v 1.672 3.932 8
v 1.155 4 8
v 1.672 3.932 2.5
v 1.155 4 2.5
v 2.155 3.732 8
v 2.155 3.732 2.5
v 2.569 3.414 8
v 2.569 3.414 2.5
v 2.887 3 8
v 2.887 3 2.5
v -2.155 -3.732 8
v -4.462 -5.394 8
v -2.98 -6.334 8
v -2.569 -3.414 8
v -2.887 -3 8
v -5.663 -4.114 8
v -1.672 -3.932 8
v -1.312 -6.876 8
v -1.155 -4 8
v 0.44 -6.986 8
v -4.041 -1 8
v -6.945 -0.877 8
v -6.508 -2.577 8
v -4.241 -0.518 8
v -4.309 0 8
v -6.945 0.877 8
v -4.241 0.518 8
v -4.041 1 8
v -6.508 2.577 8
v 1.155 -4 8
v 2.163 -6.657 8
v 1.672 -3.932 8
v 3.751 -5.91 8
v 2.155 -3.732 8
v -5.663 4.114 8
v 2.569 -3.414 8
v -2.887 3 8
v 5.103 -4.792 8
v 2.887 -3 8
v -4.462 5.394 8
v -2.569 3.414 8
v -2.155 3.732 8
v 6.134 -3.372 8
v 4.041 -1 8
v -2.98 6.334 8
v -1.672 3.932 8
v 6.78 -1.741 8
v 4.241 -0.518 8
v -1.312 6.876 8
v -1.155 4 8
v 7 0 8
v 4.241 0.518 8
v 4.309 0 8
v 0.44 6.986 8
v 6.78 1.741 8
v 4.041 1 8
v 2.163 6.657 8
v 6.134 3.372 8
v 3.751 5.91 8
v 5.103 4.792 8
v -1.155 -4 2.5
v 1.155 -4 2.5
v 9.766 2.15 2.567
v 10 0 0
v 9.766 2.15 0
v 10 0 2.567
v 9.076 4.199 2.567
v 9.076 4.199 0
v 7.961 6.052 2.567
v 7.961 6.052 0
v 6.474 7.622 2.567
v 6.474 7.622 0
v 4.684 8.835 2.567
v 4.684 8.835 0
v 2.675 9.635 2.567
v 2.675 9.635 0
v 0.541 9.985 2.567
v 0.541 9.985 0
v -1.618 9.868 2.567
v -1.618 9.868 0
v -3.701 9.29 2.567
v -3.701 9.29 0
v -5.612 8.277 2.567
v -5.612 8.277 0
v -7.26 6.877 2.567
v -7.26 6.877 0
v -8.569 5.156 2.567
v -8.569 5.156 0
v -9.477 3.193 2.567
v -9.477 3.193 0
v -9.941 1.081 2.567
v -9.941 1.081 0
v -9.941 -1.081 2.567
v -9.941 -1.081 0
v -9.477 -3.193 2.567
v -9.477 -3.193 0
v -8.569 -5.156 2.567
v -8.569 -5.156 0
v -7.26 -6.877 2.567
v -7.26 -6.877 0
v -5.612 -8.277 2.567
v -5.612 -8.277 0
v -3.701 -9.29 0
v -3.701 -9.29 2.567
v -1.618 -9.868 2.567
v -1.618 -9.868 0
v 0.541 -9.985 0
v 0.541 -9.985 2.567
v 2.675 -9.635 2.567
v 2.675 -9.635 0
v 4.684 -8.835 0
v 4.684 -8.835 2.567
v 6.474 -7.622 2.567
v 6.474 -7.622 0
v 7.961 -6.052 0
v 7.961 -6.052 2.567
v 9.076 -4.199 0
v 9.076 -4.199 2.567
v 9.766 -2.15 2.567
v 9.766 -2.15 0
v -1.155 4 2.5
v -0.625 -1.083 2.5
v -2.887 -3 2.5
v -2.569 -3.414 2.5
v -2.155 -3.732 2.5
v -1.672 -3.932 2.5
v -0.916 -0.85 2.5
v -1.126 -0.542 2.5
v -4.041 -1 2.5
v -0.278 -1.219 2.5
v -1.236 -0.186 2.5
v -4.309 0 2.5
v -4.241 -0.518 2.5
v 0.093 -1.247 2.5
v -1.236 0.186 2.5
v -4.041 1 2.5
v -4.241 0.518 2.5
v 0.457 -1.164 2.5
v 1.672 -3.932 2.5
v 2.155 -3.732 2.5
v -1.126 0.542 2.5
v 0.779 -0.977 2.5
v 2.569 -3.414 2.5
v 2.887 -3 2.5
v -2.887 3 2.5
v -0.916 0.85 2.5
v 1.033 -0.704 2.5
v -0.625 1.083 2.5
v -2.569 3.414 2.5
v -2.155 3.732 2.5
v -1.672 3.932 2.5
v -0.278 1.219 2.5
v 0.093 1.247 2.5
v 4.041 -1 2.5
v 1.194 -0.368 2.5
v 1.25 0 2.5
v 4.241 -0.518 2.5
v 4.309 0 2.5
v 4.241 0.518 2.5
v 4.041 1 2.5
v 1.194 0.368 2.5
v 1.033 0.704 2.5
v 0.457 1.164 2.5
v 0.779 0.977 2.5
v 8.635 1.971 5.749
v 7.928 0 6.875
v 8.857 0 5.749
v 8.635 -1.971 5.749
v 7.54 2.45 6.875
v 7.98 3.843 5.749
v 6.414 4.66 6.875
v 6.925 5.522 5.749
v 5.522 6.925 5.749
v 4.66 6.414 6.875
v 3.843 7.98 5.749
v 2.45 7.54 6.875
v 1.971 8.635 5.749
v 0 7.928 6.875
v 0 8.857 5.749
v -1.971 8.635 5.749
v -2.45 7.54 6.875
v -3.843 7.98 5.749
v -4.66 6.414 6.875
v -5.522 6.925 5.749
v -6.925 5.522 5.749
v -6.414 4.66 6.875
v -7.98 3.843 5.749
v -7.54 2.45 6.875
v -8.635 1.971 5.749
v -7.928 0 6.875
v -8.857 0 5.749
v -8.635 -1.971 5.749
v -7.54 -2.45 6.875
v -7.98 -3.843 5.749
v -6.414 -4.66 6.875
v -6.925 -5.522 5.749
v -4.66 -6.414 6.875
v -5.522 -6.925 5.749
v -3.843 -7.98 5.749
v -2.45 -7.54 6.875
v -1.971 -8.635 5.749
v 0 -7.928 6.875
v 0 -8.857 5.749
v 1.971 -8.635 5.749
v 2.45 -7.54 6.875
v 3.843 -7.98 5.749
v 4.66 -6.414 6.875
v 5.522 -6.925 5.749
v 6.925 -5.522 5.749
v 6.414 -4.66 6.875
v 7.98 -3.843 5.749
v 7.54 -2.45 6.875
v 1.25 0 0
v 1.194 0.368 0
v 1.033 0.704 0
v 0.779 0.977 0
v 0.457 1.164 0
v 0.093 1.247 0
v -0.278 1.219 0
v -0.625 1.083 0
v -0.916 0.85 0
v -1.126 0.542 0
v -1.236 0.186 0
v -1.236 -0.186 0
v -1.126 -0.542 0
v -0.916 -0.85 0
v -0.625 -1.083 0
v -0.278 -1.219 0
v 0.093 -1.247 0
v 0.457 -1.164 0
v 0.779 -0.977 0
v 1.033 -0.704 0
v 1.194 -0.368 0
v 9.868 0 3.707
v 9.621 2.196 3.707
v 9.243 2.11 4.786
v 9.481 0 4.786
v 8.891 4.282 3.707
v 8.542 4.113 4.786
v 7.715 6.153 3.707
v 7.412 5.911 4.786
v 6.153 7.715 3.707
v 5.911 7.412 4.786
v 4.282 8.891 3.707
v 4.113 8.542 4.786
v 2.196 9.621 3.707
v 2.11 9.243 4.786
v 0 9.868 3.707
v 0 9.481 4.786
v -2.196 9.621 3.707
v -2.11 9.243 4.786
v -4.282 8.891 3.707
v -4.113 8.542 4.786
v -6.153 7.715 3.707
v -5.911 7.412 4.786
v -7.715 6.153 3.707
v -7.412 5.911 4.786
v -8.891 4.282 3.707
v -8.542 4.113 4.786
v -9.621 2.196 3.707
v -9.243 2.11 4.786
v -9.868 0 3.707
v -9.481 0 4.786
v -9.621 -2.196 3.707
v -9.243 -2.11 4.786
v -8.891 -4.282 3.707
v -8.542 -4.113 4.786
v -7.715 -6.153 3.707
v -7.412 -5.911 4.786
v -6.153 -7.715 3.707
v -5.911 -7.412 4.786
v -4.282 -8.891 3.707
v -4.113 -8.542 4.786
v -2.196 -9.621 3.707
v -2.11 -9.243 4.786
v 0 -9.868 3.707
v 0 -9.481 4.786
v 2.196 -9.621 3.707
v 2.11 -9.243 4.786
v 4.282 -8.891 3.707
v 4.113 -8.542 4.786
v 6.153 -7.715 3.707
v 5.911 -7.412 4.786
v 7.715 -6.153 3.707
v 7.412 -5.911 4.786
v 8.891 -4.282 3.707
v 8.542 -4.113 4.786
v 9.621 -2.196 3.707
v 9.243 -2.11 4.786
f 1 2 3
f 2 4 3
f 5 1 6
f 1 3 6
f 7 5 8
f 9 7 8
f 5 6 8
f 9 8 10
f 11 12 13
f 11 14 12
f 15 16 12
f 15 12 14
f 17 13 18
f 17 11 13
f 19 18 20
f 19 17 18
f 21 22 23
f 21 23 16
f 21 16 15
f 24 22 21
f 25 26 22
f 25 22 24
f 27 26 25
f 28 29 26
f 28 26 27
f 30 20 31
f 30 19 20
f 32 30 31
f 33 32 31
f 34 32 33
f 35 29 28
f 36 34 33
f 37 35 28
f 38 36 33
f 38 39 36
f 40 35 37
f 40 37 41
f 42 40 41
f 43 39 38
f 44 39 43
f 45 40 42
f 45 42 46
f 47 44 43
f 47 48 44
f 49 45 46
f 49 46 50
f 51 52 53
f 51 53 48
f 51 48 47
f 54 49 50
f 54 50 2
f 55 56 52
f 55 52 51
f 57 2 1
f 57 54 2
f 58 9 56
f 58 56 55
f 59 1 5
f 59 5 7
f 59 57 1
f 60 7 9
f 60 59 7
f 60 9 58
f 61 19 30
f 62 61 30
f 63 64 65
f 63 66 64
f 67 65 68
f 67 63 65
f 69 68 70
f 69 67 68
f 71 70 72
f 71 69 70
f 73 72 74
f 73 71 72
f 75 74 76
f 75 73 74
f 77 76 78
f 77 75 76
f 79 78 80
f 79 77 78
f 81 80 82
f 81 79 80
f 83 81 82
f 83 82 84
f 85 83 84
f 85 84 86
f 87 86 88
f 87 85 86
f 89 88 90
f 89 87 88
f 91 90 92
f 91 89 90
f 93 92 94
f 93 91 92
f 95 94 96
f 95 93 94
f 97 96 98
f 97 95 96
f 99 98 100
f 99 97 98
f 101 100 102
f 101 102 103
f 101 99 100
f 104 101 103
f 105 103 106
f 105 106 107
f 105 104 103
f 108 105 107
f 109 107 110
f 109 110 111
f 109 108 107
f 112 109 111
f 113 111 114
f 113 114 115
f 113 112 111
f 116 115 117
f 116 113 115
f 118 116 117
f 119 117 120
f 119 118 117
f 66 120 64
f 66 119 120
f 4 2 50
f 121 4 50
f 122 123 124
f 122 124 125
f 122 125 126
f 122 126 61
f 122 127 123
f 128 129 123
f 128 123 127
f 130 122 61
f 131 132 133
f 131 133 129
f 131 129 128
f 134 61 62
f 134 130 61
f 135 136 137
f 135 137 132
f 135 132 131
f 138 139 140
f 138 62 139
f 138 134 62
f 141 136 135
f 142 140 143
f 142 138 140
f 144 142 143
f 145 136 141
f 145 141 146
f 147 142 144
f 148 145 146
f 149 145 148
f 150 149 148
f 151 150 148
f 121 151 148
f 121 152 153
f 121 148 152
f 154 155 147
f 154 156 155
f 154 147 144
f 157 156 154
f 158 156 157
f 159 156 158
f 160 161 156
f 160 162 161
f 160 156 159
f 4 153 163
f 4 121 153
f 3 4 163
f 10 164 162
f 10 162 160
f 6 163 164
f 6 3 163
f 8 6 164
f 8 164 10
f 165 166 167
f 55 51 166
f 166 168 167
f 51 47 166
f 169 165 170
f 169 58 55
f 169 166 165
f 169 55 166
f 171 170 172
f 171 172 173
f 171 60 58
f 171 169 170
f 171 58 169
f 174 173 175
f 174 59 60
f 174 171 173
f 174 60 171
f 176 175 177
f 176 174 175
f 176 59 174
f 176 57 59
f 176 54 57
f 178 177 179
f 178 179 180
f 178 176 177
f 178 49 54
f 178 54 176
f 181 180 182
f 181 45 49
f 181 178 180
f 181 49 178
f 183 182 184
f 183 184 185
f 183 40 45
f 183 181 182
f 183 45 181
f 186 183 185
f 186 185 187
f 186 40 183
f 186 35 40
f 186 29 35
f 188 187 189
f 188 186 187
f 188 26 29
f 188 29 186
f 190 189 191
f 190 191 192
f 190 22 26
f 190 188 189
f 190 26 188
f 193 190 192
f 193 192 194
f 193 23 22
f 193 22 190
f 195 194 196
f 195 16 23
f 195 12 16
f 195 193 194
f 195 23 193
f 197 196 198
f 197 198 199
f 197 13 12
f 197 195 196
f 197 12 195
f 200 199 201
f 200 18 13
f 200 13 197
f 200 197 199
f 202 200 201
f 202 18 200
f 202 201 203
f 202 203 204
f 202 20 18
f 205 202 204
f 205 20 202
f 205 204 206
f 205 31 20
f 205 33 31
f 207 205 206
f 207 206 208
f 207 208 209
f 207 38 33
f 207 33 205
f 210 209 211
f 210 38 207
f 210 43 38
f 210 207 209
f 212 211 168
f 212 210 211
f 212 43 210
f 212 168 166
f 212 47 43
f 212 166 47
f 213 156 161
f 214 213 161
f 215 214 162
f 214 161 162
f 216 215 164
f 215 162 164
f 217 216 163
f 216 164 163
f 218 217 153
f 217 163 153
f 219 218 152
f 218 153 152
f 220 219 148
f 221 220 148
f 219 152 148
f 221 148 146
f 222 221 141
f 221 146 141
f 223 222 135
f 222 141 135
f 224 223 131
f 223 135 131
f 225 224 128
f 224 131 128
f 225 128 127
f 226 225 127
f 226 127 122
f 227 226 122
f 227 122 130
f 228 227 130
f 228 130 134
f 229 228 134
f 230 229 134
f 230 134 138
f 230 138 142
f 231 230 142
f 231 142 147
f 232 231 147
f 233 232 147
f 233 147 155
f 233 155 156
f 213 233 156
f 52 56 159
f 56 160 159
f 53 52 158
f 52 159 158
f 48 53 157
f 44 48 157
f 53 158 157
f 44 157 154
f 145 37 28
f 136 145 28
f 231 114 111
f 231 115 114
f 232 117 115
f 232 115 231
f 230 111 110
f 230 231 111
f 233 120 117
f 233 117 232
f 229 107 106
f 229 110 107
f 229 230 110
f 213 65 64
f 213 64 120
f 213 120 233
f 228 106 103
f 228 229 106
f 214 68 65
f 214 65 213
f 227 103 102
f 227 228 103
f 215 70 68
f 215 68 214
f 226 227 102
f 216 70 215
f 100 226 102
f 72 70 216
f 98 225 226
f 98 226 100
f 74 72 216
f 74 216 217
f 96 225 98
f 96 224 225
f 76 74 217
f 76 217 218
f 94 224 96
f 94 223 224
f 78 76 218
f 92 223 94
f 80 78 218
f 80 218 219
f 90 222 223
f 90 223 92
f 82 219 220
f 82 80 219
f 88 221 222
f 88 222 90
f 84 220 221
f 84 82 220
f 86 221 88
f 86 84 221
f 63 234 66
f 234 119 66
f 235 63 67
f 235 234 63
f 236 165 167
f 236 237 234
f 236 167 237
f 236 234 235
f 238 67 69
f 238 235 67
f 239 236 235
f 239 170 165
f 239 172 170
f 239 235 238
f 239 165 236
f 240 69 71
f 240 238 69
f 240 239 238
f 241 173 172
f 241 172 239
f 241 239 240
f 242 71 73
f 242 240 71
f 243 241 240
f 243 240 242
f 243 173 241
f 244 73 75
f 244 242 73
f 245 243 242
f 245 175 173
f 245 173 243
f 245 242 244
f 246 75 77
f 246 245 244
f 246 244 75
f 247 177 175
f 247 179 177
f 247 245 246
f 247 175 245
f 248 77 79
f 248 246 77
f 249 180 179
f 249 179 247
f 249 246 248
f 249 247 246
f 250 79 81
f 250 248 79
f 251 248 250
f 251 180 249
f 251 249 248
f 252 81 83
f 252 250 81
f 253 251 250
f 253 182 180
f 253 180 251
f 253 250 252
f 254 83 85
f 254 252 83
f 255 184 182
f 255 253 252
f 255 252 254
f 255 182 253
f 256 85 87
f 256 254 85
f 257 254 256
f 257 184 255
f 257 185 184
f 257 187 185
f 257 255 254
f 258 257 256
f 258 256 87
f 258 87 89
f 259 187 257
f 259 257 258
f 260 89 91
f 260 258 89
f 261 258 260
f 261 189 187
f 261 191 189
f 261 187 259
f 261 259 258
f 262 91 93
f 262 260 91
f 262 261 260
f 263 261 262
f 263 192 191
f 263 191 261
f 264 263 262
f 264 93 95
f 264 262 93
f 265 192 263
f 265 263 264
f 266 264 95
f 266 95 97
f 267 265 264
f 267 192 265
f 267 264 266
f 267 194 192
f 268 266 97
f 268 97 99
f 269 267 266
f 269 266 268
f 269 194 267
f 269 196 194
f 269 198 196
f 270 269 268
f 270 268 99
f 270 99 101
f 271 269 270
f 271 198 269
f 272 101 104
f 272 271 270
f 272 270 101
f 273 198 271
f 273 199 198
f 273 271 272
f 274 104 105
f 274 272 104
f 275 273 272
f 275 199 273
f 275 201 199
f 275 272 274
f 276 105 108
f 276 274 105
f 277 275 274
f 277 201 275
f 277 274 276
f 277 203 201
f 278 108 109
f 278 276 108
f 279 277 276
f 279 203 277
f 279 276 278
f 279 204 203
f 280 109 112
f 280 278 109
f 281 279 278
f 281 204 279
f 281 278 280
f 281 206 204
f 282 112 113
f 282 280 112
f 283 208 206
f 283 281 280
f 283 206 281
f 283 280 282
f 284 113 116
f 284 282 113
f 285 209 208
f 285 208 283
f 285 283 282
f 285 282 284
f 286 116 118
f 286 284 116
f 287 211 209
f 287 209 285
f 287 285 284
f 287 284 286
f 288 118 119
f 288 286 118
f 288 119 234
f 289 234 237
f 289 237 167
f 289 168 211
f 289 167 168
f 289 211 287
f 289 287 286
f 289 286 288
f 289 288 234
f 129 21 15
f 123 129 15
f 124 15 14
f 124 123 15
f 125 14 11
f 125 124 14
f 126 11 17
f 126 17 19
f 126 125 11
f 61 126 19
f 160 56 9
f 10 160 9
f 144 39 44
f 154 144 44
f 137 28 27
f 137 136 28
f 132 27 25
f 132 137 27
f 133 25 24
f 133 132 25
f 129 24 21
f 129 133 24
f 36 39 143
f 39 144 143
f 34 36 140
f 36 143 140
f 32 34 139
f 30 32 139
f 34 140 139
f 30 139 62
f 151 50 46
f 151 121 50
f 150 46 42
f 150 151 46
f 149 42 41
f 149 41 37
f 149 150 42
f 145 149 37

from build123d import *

# Parameters (mm, degrees)
F3_DEPTH = 5.5
F4_R     = 1.25
F5_DEPTH = 3
F6_R     = 2


with BuildPart() as f1:
    # F0 (on Front) → F1 (revolve)
    with BuildSketch(Plane.XZ):
        with BuildLine():
            Line((0, 8), (0, 0))
            Line((0, 0), (10, 0))
            Line((10, 0), (10, 2.567338))
            ThreePointArc((10, 2.567338), (9.705546, 4.25785), (8.856867, 5.749252))
            Line((8.856867, 5.749252), (7, 8))
            Line((7, 8), (0, 8))
        make_face()
    revolve(axis=Axis((0, 0, 6.785496), (0, 0, 1)))

    # F2 (on face) → F3 (cut)
    with BuildSketch(Plane.XY.offset(8)):
        Polygon((2.309401, 4), (-2.309401, 4), (-4.618802, 0), (-2.309401, -4), (2.309401, -4), (4.618802, 0), align=None)
    extrude(amount=-F3_DEPTH, mode=Mode.SUBTRACT)

    # F4 (on face) → F5 (cut)
    with BuildSketch(Plane.XY.offset(2.5)):
        Circle(F4_R)
    extrude(amount=-F5_DEPTH, mode=Mode.SUBTRACT)

    # F6
    f6_edges = [f1.edges().sort_by_distance(p)[0] for p in [
        (-2.309401, 4, 5.25),
        (2.309401, 4, 5.25),
        (-2.309401, -4, 5.25),
        (2.309401, -4, 5.25),
        (-4.618802, 0, 5.25),
        (4.618802, 0, 5.25),
    ]]
    fillet(f6_edges, radius=F6_R)


solid = f1.part
